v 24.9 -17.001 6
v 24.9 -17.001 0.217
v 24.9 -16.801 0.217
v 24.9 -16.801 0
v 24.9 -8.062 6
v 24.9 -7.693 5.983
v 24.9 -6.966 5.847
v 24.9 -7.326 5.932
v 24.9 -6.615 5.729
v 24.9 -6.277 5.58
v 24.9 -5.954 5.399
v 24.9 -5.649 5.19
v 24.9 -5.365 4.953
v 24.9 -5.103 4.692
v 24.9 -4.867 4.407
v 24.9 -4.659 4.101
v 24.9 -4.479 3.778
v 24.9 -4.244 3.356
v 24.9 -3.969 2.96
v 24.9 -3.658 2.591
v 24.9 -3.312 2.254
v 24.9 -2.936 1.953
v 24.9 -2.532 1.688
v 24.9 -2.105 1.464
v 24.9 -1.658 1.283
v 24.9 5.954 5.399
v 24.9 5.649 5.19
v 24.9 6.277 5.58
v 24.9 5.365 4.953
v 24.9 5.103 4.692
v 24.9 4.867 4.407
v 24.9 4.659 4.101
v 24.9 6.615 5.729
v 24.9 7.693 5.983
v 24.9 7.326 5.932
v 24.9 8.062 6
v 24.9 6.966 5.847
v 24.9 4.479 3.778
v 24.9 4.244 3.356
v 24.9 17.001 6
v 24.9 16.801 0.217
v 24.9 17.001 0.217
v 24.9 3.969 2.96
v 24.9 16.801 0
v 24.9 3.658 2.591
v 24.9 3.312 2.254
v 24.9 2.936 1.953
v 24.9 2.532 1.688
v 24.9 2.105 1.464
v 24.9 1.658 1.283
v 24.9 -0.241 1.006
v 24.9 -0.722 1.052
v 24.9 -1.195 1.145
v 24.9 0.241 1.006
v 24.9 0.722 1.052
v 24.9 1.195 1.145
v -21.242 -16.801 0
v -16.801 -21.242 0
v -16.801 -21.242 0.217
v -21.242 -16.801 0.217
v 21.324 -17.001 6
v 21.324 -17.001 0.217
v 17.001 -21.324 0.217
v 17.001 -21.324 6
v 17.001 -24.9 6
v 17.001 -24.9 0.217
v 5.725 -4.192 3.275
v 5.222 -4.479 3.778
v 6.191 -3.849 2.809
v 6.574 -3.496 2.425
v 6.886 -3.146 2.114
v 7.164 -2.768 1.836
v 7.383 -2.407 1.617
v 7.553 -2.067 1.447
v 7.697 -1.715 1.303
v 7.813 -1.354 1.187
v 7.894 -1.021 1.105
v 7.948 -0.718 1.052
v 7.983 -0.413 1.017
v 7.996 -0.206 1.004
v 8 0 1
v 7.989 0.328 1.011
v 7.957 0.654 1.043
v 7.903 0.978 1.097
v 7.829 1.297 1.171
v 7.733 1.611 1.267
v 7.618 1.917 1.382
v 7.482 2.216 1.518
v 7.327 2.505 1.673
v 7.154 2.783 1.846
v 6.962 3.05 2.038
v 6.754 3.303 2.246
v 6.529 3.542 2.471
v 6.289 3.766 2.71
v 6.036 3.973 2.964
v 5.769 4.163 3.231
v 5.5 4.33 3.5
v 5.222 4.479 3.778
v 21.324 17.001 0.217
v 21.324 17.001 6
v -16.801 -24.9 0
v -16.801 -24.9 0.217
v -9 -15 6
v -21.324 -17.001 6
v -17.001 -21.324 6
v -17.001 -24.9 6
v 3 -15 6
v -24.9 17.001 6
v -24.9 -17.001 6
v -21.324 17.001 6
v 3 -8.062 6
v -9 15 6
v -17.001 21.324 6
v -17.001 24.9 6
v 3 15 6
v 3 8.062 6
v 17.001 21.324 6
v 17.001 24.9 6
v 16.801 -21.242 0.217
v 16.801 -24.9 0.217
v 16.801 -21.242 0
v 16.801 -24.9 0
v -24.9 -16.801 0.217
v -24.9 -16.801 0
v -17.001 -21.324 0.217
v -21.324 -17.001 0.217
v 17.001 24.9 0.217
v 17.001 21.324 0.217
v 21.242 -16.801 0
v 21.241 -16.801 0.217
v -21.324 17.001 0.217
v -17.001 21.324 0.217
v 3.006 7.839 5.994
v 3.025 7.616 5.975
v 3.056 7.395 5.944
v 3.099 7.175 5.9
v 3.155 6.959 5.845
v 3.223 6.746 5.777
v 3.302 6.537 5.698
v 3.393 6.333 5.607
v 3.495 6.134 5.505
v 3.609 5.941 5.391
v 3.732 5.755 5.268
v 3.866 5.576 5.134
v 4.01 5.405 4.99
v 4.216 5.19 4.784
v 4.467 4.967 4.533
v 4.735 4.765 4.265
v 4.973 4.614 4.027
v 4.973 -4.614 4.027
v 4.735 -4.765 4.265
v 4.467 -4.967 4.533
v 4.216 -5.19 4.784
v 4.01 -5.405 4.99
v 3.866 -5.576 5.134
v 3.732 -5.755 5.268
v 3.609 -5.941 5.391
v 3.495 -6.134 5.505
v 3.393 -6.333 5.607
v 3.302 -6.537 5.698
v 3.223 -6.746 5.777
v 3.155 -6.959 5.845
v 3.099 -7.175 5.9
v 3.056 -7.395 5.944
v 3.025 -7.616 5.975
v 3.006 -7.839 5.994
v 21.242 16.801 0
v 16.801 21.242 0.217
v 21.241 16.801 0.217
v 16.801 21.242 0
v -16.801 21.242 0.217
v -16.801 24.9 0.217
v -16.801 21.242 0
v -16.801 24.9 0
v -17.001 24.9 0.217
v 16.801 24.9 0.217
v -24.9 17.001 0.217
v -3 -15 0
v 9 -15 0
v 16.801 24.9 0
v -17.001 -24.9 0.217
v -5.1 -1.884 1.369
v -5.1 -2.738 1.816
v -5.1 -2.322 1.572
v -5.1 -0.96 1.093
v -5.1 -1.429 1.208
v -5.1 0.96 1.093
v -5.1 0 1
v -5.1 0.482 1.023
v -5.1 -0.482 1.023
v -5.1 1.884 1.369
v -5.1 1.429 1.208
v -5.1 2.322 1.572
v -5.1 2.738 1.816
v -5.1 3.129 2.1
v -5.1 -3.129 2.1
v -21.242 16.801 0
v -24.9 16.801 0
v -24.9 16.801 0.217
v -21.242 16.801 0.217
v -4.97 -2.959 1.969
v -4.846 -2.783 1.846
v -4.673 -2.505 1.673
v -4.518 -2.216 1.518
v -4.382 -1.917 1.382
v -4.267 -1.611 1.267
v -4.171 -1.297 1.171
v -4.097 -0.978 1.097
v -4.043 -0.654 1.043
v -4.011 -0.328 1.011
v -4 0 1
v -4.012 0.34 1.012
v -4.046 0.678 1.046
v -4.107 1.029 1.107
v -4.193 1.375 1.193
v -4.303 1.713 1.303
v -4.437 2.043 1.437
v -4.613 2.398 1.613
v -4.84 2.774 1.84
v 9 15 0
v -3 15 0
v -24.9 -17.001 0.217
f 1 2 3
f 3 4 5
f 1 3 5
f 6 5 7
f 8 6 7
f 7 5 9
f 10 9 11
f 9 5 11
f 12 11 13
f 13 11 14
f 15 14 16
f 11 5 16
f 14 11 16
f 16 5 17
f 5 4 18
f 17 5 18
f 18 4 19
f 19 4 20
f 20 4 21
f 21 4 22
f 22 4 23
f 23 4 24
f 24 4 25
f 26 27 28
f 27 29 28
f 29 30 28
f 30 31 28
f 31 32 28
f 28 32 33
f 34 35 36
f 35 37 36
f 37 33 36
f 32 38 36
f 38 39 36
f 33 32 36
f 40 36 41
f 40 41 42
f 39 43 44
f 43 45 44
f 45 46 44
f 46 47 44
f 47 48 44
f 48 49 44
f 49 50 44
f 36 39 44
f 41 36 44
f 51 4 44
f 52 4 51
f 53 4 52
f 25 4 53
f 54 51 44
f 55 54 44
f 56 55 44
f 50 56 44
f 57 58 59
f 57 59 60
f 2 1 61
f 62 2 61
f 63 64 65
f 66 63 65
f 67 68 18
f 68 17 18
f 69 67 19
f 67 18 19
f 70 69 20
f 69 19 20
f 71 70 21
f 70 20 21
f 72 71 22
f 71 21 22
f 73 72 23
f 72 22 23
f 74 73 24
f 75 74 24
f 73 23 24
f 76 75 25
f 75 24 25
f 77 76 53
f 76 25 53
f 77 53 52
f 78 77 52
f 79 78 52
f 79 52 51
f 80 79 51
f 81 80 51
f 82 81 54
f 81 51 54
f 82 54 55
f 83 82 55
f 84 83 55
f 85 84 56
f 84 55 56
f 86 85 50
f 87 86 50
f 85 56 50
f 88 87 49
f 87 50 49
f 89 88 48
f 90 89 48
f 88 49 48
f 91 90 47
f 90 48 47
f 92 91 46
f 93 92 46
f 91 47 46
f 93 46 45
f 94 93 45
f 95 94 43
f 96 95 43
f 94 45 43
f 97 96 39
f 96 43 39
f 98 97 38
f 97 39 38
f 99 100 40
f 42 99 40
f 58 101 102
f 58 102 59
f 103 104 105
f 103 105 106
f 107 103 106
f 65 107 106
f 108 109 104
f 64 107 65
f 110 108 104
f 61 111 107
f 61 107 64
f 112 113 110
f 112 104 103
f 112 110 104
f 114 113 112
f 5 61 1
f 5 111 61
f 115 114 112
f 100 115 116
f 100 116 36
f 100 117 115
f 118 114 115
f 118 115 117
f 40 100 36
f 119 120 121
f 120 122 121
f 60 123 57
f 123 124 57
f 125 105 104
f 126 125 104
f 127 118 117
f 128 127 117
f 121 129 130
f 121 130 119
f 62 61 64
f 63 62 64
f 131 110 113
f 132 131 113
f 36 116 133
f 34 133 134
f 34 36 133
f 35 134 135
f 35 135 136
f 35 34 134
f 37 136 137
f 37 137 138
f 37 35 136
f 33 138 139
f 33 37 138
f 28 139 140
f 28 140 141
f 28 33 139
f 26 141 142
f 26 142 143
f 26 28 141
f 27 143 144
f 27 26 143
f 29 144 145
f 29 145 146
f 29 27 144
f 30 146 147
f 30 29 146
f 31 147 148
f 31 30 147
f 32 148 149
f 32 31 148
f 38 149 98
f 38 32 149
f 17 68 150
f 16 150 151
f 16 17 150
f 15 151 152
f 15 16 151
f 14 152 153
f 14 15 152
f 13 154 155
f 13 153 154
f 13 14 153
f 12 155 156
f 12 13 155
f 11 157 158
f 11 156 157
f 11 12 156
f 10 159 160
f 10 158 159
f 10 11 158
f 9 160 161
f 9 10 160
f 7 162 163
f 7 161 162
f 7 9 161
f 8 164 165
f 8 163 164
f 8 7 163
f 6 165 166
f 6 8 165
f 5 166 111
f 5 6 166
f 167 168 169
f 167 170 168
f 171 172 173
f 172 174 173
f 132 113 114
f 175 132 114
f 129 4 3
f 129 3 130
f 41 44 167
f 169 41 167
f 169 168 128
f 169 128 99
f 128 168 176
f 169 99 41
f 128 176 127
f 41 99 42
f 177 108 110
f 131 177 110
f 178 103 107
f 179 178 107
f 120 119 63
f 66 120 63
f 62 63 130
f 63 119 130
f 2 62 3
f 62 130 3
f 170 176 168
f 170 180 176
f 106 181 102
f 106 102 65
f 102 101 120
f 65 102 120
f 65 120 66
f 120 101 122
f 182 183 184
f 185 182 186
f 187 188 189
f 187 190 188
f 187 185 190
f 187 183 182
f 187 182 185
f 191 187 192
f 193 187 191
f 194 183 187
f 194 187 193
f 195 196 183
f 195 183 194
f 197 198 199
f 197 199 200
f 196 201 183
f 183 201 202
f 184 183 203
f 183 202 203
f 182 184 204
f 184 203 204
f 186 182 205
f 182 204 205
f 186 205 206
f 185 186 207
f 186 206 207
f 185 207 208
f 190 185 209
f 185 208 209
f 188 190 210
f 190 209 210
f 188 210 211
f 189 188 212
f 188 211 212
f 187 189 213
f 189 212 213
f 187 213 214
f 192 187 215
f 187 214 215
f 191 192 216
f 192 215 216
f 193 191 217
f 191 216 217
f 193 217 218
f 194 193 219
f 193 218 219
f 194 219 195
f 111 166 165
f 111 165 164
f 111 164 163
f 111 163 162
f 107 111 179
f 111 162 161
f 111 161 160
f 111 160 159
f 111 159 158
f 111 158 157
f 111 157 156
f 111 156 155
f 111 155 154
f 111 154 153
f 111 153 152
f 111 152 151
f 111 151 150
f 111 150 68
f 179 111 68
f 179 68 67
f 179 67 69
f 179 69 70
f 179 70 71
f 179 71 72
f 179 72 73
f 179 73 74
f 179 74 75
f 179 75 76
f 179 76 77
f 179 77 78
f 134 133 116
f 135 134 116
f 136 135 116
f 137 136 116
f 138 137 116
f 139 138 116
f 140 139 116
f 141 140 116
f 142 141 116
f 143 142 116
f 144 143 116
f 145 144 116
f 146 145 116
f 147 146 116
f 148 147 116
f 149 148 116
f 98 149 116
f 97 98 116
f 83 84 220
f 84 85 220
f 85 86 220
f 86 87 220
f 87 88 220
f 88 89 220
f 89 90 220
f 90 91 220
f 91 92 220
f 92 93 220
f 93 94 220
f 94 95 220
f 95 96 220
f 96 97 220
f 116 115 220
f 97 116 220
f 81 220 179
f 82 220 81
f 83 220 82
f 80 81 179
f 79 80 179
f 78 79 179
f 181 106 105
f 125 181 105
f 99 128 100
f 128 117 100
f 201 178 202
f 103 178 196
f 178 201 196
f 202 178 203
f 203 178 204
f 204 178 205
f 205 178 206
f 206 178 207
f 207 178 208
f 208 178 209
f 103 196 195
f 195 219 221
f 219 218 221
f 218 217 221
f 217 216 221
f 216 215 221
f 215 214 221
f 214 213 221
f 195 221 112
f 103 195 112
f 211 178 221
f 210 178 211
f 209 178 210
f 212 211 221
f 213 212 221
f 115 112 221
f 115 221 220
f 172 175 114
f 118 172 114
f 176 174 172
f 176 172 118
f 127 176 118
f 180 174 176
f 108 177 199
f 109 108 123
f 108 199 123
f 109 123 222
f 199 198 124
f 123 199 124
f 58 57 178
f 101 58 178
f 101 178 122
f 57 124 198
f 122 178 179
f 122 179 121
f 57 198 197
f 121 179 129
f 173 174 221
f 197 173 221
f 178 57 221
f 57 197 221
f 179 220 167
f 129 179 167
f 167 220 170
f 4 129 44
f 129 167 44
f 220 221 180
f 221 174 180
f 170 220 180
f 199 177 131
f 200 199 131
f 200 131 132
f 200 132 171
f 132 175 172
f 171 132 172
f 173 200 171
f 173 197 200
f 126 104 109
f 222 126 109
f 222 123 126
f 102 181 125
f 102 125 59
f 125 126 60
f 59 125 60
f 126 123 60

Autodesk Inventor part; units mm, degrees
ref_plane "Work Plane1" through (-29.1, -14.5, 2.4) normal (0, 0, -1) x (0, 1, 0)
ref_plane "Work Plane2" through (-13.8999, -10.5497, 2.25) normal (0, 0, -1) x (0, 1, 0)
sketch "Sketch1" plane through (0, 0, 0) normal (0, 0, 1) x (1, 0, 0)
  line L0 (-34.86, 0) -> (34.86, 0) construction
  line L1 (0, -34.86) -> (0, 34.86) construction
  line L2 (0, 0) -> (11.1575, 11.1575) construction
  line L3 (0, 0) -> (15.7791, 0) construction
  line L4 (0, 24.9) -> (16.8009, 24.9)
  line L5 (16.8009, 24.9) -> (16.8009, 21.2415)
  line L6 (16.8009, 21.2415) -> (19.0212, 19.0212)
  line L7 (24.9, 0) -> (24.9, 16.8009)
  line L8 (24.9, 16.8009) -> (21.2415, 16.8009)
  line L9 (21.2415, 16.8009) -> (19.0212, 19.0212)
  line L10 (0, -24.9) -> (16.8009, -24.9)
  line L11 (16.8009, -24.9) -> (16.8009, -21.2415)
  line L12 (16.8009, -21.2415) -> (19.0212, -19.0212)
  line L13 (24.9, 0) -> (24.9, -16.8009)
  line L14 (24.9, -16.8009) -> (21.2415, -16.8009)
  line L15 (21.2415, -16.8009) -> (19.0212, -19.0212)
  line L16 (0, 24.9) -> (-16.8009, 24.9)
  line L17 (-16.8009, 24.9) -> (-16.8009, 21.2415)
  line L18 (-16.8009, 21.2415) -> (-19.0212, 19.0212)
  line L19 (-24.9, 16.8009) -> (-21.2415, 16.8009)
  line L20 (-21.2415, 16.8009) -> (-19.0212, 19.0212)
  line L21 (0, -24.9) -> (-16.8009, -24.9)
  line L22 (-16.8009, -24.9) -> (-16.8009, -21.2415)
  line L23 (-16.8009, -21.2415) -> (-19.0212, -19.0212)
  line L24 (-21.2415, -16.8009) -> (-19.0212, -19.0212)
  line L25 (-24.9, -16.8009) -> (-21.2415, -16.8009)
  line L26 (-24.9, 0) -> (-24.9, -16.8009)
  line L27 (-24.9, 0) -> (-24.9, 16.8009)
  circle A0 centre (0, 0) radius 3
  dimension "d0" = 45
  dimension "d2" = 24.9
  dimension "d3" = 3.14
  dimension "d4" = 26.9
  dimension "d5" = 6
extrude "Extrusion1" add sketch "Sketch1" along normal blind 6
ref_plane "Work Plane4" through (-16.9391, -17.02, 0.2169) normal (0, 0, 1) x (1, 0, 0)
sketch "Skizze6" plane through (-16.8009, 24.9, 6) normal (0, 0, 1) x (1, 0, 0)
  circle A0 centre (6.8009, -18) radius 1.65 construction
  circle A1 centre (3.0009, -24.9) radius 1.65 construction
  circle A2 centre (26.5009, -34.9) radius 1.65 construction
  circle A3 centre (26.5009, -14.9) radius 1.65 construction
  circle A4 centre (16.8009, -24.9) radius 10 construction
  line L0 (33.6017, -3.6585) -> (33.6017, 0) projected
  line L1 (33.6017, 0) -> (0, 0) construction
  line L2 (0, 0) -> (0, -3.6585) projected
  line L3 (0, -3.6585) -> (-4.4406, -8.0991) projected
  line L4 (-4.4406, -8.0991) -> (-8.0991, -8.0991) projected
  line L5 (-8.0991, -8.0991) -> (-8.0991, -41.7009) construction
  line L6 (-8.0991, -41.7009) -> (-4.4406, -41.7009) projected
  line L7 (-4.4406, -41.7009) -> (0, -46.1415) projected
  line L8 (0, -46.1415) -> (0, -49.8) projected
  line L9 (0, -49.8) -> (33.6017, -49.8) construction
  line L10 (33.6017, -49.8) -> (33.6017, -46.1415) projected
  line L11 (33.6017, -46.1415) -> (38.0423, -41.7009) projected
  line L12 (38.0423, -41.7009) -> (41.7009, -41.7009) projected
  line L13 (41.7009, -41.7009) -> (41.7009, -8.0991) construction
  line L14 (41.7009, -8.0991) -> (38.0423, -8.0991) projected
  line L15 (38.0423, -8.0991) -> (33.6017, -3.6585) projected
  line L16 (-0.2, 0.2) -> (33.8017, 0.2) construction
  line L17 (33.8017, 0.2) -> (33.8017, -3.5757)
  line L18 (33.8017, -3.5757) -> (38.1252, -7.8991)
  line L19 (38.1252, -7.8991) -> (41.9009, -7.8991)
  line L20 (41.9009, -7.8991) -> (41.9009, -41.9009) construction
  line L21 (41.9009, -41.9009) -> (38.1252, -41.9009)
  line L22 (38.1252, -41.9009) -> (33.8017, -46.2243)
  line L23 (33.8017, -46.2243) -> (33.8017, -50)
  line L24 (33.8017, -50) -> (-0.2, -50) construction
  line L25 (-0.2, -50) -> (-0.2, -46.2243)
  line L26 (-0.2, -46.2243) -> (-4.5235, -41.9009)
  line L27 (-4.5235, -41.9009) -> (-8.2991, -41.9009)
  line L28 (-8.2991, -41.9009) -> (-8.2991, -7.8991) construction
  line L29 (-8.2991, -7.8991) -> (-4.5235, -7.8991)
  line L30 (-4.5235, -7.8991) -> (-0.2, -3.5757)
  line L31 (-0.2, -3.5757) -> (-0.2, 0.2)
  line L32 (-8.0991, -8.0991) -> (-8.0991, -7.8991)
  line L33 (0, 0) -> (-0.2, 0)
  line L34 (33.6017, 0) -> (33.8017, 0)
  line L35 (41.7009, -8.0991) -> (38.0423, -8.0991) projected
  line L36 (41.7009, -8.0991) -> (41.7009, -7.8991)
  line L37 (41.7009, -41.7009) -> (41.7009, -41.9009)
  line L38 (33.6017, -49.8) -> (33.8017, -49.8)
  line L39 (-8.0991, -41.7009) -> (-8.0991, -41.9009)
  line L40 (0, -49.8) -> (-0.2, -49.8)
  point P0 (16.8009, -24.9)
  dimension "d25" = 0.2
extrude "IM_offset" add sketch "Skizze6" against normal up to surface (5.7831 mm away)
ref_plane "Work Plane3" through (-17.0009, 0, 0) normal (0, -1, 0) x (1, 0, 0)
sketch "Sketch7" plane through (-17.0009, 0, 0) normal (0, -1, 0) x (1, 0, 0)
  line L0 (6.6601, 19.3407) -> (38.4799, -12.4791)
  line L1 (38.4799, -12.4791) -> (32.4799, -18.4791)
  line L2 (32.4799, -18.4791) -> (0.6601, 13.3407)
  line L3 (0.6601, 13.3407) -> (6.6601, 19.3407)
  line L4 (6.6601, 19.3407) -> (51.6601, 19.3407) construction
  line L5 (14.0009, 6) -> (20.0009, 6) projected
  line L6 (20.0009, 0) -> (14.0009, 0) projected
  point P0 (17.0009, 0)
  dimension "d28" = 45
  dimension "d29" = 45
extrude "Extrusion6" cut sketch "Sketch7" along normal mid plane 30
sketch "Sketch8" plane through (24.9, 16.8009, 6) normal (1, 0, 0) x (0, 0, -1)
  line L0 (6, 0) -> (6, -33.6017) projected
  line L1 (0, -33.8017) -> (0, 0.2) projected
  line L2 (0, -33.8017) -> (5.7831, -33.8017) projected
  circle A0 centre (0, -16.8009) radius 5
  line L3 (0, 0.2) -> (5.7831, 0.2) projected
  line L4 (6, 0) -> (5.7831, 0) projected
  line L5 (5.7831, 0.2) -> (5.7831, 0) projected
  line L6 (5.7831, -33.6017) -> (5.7831, -33.8017) projected
  line L7 (6, -33.6017) -> (5.7831, -33.6017) projected
  point P0 (6, -16.8009)
  dimension "d32" = 10
extrude "Extrusion7" cut sketch "Sketch8" against normal blind 30 contours A0 L1 | L1 A0
fillet "Fillet1" radius 4 2 edges at (13.95, 5, 6) (13.95, -5, 6)
properties part number "20_Cube_insert_Fluorescence_Darkfield_Mirror_v3"
